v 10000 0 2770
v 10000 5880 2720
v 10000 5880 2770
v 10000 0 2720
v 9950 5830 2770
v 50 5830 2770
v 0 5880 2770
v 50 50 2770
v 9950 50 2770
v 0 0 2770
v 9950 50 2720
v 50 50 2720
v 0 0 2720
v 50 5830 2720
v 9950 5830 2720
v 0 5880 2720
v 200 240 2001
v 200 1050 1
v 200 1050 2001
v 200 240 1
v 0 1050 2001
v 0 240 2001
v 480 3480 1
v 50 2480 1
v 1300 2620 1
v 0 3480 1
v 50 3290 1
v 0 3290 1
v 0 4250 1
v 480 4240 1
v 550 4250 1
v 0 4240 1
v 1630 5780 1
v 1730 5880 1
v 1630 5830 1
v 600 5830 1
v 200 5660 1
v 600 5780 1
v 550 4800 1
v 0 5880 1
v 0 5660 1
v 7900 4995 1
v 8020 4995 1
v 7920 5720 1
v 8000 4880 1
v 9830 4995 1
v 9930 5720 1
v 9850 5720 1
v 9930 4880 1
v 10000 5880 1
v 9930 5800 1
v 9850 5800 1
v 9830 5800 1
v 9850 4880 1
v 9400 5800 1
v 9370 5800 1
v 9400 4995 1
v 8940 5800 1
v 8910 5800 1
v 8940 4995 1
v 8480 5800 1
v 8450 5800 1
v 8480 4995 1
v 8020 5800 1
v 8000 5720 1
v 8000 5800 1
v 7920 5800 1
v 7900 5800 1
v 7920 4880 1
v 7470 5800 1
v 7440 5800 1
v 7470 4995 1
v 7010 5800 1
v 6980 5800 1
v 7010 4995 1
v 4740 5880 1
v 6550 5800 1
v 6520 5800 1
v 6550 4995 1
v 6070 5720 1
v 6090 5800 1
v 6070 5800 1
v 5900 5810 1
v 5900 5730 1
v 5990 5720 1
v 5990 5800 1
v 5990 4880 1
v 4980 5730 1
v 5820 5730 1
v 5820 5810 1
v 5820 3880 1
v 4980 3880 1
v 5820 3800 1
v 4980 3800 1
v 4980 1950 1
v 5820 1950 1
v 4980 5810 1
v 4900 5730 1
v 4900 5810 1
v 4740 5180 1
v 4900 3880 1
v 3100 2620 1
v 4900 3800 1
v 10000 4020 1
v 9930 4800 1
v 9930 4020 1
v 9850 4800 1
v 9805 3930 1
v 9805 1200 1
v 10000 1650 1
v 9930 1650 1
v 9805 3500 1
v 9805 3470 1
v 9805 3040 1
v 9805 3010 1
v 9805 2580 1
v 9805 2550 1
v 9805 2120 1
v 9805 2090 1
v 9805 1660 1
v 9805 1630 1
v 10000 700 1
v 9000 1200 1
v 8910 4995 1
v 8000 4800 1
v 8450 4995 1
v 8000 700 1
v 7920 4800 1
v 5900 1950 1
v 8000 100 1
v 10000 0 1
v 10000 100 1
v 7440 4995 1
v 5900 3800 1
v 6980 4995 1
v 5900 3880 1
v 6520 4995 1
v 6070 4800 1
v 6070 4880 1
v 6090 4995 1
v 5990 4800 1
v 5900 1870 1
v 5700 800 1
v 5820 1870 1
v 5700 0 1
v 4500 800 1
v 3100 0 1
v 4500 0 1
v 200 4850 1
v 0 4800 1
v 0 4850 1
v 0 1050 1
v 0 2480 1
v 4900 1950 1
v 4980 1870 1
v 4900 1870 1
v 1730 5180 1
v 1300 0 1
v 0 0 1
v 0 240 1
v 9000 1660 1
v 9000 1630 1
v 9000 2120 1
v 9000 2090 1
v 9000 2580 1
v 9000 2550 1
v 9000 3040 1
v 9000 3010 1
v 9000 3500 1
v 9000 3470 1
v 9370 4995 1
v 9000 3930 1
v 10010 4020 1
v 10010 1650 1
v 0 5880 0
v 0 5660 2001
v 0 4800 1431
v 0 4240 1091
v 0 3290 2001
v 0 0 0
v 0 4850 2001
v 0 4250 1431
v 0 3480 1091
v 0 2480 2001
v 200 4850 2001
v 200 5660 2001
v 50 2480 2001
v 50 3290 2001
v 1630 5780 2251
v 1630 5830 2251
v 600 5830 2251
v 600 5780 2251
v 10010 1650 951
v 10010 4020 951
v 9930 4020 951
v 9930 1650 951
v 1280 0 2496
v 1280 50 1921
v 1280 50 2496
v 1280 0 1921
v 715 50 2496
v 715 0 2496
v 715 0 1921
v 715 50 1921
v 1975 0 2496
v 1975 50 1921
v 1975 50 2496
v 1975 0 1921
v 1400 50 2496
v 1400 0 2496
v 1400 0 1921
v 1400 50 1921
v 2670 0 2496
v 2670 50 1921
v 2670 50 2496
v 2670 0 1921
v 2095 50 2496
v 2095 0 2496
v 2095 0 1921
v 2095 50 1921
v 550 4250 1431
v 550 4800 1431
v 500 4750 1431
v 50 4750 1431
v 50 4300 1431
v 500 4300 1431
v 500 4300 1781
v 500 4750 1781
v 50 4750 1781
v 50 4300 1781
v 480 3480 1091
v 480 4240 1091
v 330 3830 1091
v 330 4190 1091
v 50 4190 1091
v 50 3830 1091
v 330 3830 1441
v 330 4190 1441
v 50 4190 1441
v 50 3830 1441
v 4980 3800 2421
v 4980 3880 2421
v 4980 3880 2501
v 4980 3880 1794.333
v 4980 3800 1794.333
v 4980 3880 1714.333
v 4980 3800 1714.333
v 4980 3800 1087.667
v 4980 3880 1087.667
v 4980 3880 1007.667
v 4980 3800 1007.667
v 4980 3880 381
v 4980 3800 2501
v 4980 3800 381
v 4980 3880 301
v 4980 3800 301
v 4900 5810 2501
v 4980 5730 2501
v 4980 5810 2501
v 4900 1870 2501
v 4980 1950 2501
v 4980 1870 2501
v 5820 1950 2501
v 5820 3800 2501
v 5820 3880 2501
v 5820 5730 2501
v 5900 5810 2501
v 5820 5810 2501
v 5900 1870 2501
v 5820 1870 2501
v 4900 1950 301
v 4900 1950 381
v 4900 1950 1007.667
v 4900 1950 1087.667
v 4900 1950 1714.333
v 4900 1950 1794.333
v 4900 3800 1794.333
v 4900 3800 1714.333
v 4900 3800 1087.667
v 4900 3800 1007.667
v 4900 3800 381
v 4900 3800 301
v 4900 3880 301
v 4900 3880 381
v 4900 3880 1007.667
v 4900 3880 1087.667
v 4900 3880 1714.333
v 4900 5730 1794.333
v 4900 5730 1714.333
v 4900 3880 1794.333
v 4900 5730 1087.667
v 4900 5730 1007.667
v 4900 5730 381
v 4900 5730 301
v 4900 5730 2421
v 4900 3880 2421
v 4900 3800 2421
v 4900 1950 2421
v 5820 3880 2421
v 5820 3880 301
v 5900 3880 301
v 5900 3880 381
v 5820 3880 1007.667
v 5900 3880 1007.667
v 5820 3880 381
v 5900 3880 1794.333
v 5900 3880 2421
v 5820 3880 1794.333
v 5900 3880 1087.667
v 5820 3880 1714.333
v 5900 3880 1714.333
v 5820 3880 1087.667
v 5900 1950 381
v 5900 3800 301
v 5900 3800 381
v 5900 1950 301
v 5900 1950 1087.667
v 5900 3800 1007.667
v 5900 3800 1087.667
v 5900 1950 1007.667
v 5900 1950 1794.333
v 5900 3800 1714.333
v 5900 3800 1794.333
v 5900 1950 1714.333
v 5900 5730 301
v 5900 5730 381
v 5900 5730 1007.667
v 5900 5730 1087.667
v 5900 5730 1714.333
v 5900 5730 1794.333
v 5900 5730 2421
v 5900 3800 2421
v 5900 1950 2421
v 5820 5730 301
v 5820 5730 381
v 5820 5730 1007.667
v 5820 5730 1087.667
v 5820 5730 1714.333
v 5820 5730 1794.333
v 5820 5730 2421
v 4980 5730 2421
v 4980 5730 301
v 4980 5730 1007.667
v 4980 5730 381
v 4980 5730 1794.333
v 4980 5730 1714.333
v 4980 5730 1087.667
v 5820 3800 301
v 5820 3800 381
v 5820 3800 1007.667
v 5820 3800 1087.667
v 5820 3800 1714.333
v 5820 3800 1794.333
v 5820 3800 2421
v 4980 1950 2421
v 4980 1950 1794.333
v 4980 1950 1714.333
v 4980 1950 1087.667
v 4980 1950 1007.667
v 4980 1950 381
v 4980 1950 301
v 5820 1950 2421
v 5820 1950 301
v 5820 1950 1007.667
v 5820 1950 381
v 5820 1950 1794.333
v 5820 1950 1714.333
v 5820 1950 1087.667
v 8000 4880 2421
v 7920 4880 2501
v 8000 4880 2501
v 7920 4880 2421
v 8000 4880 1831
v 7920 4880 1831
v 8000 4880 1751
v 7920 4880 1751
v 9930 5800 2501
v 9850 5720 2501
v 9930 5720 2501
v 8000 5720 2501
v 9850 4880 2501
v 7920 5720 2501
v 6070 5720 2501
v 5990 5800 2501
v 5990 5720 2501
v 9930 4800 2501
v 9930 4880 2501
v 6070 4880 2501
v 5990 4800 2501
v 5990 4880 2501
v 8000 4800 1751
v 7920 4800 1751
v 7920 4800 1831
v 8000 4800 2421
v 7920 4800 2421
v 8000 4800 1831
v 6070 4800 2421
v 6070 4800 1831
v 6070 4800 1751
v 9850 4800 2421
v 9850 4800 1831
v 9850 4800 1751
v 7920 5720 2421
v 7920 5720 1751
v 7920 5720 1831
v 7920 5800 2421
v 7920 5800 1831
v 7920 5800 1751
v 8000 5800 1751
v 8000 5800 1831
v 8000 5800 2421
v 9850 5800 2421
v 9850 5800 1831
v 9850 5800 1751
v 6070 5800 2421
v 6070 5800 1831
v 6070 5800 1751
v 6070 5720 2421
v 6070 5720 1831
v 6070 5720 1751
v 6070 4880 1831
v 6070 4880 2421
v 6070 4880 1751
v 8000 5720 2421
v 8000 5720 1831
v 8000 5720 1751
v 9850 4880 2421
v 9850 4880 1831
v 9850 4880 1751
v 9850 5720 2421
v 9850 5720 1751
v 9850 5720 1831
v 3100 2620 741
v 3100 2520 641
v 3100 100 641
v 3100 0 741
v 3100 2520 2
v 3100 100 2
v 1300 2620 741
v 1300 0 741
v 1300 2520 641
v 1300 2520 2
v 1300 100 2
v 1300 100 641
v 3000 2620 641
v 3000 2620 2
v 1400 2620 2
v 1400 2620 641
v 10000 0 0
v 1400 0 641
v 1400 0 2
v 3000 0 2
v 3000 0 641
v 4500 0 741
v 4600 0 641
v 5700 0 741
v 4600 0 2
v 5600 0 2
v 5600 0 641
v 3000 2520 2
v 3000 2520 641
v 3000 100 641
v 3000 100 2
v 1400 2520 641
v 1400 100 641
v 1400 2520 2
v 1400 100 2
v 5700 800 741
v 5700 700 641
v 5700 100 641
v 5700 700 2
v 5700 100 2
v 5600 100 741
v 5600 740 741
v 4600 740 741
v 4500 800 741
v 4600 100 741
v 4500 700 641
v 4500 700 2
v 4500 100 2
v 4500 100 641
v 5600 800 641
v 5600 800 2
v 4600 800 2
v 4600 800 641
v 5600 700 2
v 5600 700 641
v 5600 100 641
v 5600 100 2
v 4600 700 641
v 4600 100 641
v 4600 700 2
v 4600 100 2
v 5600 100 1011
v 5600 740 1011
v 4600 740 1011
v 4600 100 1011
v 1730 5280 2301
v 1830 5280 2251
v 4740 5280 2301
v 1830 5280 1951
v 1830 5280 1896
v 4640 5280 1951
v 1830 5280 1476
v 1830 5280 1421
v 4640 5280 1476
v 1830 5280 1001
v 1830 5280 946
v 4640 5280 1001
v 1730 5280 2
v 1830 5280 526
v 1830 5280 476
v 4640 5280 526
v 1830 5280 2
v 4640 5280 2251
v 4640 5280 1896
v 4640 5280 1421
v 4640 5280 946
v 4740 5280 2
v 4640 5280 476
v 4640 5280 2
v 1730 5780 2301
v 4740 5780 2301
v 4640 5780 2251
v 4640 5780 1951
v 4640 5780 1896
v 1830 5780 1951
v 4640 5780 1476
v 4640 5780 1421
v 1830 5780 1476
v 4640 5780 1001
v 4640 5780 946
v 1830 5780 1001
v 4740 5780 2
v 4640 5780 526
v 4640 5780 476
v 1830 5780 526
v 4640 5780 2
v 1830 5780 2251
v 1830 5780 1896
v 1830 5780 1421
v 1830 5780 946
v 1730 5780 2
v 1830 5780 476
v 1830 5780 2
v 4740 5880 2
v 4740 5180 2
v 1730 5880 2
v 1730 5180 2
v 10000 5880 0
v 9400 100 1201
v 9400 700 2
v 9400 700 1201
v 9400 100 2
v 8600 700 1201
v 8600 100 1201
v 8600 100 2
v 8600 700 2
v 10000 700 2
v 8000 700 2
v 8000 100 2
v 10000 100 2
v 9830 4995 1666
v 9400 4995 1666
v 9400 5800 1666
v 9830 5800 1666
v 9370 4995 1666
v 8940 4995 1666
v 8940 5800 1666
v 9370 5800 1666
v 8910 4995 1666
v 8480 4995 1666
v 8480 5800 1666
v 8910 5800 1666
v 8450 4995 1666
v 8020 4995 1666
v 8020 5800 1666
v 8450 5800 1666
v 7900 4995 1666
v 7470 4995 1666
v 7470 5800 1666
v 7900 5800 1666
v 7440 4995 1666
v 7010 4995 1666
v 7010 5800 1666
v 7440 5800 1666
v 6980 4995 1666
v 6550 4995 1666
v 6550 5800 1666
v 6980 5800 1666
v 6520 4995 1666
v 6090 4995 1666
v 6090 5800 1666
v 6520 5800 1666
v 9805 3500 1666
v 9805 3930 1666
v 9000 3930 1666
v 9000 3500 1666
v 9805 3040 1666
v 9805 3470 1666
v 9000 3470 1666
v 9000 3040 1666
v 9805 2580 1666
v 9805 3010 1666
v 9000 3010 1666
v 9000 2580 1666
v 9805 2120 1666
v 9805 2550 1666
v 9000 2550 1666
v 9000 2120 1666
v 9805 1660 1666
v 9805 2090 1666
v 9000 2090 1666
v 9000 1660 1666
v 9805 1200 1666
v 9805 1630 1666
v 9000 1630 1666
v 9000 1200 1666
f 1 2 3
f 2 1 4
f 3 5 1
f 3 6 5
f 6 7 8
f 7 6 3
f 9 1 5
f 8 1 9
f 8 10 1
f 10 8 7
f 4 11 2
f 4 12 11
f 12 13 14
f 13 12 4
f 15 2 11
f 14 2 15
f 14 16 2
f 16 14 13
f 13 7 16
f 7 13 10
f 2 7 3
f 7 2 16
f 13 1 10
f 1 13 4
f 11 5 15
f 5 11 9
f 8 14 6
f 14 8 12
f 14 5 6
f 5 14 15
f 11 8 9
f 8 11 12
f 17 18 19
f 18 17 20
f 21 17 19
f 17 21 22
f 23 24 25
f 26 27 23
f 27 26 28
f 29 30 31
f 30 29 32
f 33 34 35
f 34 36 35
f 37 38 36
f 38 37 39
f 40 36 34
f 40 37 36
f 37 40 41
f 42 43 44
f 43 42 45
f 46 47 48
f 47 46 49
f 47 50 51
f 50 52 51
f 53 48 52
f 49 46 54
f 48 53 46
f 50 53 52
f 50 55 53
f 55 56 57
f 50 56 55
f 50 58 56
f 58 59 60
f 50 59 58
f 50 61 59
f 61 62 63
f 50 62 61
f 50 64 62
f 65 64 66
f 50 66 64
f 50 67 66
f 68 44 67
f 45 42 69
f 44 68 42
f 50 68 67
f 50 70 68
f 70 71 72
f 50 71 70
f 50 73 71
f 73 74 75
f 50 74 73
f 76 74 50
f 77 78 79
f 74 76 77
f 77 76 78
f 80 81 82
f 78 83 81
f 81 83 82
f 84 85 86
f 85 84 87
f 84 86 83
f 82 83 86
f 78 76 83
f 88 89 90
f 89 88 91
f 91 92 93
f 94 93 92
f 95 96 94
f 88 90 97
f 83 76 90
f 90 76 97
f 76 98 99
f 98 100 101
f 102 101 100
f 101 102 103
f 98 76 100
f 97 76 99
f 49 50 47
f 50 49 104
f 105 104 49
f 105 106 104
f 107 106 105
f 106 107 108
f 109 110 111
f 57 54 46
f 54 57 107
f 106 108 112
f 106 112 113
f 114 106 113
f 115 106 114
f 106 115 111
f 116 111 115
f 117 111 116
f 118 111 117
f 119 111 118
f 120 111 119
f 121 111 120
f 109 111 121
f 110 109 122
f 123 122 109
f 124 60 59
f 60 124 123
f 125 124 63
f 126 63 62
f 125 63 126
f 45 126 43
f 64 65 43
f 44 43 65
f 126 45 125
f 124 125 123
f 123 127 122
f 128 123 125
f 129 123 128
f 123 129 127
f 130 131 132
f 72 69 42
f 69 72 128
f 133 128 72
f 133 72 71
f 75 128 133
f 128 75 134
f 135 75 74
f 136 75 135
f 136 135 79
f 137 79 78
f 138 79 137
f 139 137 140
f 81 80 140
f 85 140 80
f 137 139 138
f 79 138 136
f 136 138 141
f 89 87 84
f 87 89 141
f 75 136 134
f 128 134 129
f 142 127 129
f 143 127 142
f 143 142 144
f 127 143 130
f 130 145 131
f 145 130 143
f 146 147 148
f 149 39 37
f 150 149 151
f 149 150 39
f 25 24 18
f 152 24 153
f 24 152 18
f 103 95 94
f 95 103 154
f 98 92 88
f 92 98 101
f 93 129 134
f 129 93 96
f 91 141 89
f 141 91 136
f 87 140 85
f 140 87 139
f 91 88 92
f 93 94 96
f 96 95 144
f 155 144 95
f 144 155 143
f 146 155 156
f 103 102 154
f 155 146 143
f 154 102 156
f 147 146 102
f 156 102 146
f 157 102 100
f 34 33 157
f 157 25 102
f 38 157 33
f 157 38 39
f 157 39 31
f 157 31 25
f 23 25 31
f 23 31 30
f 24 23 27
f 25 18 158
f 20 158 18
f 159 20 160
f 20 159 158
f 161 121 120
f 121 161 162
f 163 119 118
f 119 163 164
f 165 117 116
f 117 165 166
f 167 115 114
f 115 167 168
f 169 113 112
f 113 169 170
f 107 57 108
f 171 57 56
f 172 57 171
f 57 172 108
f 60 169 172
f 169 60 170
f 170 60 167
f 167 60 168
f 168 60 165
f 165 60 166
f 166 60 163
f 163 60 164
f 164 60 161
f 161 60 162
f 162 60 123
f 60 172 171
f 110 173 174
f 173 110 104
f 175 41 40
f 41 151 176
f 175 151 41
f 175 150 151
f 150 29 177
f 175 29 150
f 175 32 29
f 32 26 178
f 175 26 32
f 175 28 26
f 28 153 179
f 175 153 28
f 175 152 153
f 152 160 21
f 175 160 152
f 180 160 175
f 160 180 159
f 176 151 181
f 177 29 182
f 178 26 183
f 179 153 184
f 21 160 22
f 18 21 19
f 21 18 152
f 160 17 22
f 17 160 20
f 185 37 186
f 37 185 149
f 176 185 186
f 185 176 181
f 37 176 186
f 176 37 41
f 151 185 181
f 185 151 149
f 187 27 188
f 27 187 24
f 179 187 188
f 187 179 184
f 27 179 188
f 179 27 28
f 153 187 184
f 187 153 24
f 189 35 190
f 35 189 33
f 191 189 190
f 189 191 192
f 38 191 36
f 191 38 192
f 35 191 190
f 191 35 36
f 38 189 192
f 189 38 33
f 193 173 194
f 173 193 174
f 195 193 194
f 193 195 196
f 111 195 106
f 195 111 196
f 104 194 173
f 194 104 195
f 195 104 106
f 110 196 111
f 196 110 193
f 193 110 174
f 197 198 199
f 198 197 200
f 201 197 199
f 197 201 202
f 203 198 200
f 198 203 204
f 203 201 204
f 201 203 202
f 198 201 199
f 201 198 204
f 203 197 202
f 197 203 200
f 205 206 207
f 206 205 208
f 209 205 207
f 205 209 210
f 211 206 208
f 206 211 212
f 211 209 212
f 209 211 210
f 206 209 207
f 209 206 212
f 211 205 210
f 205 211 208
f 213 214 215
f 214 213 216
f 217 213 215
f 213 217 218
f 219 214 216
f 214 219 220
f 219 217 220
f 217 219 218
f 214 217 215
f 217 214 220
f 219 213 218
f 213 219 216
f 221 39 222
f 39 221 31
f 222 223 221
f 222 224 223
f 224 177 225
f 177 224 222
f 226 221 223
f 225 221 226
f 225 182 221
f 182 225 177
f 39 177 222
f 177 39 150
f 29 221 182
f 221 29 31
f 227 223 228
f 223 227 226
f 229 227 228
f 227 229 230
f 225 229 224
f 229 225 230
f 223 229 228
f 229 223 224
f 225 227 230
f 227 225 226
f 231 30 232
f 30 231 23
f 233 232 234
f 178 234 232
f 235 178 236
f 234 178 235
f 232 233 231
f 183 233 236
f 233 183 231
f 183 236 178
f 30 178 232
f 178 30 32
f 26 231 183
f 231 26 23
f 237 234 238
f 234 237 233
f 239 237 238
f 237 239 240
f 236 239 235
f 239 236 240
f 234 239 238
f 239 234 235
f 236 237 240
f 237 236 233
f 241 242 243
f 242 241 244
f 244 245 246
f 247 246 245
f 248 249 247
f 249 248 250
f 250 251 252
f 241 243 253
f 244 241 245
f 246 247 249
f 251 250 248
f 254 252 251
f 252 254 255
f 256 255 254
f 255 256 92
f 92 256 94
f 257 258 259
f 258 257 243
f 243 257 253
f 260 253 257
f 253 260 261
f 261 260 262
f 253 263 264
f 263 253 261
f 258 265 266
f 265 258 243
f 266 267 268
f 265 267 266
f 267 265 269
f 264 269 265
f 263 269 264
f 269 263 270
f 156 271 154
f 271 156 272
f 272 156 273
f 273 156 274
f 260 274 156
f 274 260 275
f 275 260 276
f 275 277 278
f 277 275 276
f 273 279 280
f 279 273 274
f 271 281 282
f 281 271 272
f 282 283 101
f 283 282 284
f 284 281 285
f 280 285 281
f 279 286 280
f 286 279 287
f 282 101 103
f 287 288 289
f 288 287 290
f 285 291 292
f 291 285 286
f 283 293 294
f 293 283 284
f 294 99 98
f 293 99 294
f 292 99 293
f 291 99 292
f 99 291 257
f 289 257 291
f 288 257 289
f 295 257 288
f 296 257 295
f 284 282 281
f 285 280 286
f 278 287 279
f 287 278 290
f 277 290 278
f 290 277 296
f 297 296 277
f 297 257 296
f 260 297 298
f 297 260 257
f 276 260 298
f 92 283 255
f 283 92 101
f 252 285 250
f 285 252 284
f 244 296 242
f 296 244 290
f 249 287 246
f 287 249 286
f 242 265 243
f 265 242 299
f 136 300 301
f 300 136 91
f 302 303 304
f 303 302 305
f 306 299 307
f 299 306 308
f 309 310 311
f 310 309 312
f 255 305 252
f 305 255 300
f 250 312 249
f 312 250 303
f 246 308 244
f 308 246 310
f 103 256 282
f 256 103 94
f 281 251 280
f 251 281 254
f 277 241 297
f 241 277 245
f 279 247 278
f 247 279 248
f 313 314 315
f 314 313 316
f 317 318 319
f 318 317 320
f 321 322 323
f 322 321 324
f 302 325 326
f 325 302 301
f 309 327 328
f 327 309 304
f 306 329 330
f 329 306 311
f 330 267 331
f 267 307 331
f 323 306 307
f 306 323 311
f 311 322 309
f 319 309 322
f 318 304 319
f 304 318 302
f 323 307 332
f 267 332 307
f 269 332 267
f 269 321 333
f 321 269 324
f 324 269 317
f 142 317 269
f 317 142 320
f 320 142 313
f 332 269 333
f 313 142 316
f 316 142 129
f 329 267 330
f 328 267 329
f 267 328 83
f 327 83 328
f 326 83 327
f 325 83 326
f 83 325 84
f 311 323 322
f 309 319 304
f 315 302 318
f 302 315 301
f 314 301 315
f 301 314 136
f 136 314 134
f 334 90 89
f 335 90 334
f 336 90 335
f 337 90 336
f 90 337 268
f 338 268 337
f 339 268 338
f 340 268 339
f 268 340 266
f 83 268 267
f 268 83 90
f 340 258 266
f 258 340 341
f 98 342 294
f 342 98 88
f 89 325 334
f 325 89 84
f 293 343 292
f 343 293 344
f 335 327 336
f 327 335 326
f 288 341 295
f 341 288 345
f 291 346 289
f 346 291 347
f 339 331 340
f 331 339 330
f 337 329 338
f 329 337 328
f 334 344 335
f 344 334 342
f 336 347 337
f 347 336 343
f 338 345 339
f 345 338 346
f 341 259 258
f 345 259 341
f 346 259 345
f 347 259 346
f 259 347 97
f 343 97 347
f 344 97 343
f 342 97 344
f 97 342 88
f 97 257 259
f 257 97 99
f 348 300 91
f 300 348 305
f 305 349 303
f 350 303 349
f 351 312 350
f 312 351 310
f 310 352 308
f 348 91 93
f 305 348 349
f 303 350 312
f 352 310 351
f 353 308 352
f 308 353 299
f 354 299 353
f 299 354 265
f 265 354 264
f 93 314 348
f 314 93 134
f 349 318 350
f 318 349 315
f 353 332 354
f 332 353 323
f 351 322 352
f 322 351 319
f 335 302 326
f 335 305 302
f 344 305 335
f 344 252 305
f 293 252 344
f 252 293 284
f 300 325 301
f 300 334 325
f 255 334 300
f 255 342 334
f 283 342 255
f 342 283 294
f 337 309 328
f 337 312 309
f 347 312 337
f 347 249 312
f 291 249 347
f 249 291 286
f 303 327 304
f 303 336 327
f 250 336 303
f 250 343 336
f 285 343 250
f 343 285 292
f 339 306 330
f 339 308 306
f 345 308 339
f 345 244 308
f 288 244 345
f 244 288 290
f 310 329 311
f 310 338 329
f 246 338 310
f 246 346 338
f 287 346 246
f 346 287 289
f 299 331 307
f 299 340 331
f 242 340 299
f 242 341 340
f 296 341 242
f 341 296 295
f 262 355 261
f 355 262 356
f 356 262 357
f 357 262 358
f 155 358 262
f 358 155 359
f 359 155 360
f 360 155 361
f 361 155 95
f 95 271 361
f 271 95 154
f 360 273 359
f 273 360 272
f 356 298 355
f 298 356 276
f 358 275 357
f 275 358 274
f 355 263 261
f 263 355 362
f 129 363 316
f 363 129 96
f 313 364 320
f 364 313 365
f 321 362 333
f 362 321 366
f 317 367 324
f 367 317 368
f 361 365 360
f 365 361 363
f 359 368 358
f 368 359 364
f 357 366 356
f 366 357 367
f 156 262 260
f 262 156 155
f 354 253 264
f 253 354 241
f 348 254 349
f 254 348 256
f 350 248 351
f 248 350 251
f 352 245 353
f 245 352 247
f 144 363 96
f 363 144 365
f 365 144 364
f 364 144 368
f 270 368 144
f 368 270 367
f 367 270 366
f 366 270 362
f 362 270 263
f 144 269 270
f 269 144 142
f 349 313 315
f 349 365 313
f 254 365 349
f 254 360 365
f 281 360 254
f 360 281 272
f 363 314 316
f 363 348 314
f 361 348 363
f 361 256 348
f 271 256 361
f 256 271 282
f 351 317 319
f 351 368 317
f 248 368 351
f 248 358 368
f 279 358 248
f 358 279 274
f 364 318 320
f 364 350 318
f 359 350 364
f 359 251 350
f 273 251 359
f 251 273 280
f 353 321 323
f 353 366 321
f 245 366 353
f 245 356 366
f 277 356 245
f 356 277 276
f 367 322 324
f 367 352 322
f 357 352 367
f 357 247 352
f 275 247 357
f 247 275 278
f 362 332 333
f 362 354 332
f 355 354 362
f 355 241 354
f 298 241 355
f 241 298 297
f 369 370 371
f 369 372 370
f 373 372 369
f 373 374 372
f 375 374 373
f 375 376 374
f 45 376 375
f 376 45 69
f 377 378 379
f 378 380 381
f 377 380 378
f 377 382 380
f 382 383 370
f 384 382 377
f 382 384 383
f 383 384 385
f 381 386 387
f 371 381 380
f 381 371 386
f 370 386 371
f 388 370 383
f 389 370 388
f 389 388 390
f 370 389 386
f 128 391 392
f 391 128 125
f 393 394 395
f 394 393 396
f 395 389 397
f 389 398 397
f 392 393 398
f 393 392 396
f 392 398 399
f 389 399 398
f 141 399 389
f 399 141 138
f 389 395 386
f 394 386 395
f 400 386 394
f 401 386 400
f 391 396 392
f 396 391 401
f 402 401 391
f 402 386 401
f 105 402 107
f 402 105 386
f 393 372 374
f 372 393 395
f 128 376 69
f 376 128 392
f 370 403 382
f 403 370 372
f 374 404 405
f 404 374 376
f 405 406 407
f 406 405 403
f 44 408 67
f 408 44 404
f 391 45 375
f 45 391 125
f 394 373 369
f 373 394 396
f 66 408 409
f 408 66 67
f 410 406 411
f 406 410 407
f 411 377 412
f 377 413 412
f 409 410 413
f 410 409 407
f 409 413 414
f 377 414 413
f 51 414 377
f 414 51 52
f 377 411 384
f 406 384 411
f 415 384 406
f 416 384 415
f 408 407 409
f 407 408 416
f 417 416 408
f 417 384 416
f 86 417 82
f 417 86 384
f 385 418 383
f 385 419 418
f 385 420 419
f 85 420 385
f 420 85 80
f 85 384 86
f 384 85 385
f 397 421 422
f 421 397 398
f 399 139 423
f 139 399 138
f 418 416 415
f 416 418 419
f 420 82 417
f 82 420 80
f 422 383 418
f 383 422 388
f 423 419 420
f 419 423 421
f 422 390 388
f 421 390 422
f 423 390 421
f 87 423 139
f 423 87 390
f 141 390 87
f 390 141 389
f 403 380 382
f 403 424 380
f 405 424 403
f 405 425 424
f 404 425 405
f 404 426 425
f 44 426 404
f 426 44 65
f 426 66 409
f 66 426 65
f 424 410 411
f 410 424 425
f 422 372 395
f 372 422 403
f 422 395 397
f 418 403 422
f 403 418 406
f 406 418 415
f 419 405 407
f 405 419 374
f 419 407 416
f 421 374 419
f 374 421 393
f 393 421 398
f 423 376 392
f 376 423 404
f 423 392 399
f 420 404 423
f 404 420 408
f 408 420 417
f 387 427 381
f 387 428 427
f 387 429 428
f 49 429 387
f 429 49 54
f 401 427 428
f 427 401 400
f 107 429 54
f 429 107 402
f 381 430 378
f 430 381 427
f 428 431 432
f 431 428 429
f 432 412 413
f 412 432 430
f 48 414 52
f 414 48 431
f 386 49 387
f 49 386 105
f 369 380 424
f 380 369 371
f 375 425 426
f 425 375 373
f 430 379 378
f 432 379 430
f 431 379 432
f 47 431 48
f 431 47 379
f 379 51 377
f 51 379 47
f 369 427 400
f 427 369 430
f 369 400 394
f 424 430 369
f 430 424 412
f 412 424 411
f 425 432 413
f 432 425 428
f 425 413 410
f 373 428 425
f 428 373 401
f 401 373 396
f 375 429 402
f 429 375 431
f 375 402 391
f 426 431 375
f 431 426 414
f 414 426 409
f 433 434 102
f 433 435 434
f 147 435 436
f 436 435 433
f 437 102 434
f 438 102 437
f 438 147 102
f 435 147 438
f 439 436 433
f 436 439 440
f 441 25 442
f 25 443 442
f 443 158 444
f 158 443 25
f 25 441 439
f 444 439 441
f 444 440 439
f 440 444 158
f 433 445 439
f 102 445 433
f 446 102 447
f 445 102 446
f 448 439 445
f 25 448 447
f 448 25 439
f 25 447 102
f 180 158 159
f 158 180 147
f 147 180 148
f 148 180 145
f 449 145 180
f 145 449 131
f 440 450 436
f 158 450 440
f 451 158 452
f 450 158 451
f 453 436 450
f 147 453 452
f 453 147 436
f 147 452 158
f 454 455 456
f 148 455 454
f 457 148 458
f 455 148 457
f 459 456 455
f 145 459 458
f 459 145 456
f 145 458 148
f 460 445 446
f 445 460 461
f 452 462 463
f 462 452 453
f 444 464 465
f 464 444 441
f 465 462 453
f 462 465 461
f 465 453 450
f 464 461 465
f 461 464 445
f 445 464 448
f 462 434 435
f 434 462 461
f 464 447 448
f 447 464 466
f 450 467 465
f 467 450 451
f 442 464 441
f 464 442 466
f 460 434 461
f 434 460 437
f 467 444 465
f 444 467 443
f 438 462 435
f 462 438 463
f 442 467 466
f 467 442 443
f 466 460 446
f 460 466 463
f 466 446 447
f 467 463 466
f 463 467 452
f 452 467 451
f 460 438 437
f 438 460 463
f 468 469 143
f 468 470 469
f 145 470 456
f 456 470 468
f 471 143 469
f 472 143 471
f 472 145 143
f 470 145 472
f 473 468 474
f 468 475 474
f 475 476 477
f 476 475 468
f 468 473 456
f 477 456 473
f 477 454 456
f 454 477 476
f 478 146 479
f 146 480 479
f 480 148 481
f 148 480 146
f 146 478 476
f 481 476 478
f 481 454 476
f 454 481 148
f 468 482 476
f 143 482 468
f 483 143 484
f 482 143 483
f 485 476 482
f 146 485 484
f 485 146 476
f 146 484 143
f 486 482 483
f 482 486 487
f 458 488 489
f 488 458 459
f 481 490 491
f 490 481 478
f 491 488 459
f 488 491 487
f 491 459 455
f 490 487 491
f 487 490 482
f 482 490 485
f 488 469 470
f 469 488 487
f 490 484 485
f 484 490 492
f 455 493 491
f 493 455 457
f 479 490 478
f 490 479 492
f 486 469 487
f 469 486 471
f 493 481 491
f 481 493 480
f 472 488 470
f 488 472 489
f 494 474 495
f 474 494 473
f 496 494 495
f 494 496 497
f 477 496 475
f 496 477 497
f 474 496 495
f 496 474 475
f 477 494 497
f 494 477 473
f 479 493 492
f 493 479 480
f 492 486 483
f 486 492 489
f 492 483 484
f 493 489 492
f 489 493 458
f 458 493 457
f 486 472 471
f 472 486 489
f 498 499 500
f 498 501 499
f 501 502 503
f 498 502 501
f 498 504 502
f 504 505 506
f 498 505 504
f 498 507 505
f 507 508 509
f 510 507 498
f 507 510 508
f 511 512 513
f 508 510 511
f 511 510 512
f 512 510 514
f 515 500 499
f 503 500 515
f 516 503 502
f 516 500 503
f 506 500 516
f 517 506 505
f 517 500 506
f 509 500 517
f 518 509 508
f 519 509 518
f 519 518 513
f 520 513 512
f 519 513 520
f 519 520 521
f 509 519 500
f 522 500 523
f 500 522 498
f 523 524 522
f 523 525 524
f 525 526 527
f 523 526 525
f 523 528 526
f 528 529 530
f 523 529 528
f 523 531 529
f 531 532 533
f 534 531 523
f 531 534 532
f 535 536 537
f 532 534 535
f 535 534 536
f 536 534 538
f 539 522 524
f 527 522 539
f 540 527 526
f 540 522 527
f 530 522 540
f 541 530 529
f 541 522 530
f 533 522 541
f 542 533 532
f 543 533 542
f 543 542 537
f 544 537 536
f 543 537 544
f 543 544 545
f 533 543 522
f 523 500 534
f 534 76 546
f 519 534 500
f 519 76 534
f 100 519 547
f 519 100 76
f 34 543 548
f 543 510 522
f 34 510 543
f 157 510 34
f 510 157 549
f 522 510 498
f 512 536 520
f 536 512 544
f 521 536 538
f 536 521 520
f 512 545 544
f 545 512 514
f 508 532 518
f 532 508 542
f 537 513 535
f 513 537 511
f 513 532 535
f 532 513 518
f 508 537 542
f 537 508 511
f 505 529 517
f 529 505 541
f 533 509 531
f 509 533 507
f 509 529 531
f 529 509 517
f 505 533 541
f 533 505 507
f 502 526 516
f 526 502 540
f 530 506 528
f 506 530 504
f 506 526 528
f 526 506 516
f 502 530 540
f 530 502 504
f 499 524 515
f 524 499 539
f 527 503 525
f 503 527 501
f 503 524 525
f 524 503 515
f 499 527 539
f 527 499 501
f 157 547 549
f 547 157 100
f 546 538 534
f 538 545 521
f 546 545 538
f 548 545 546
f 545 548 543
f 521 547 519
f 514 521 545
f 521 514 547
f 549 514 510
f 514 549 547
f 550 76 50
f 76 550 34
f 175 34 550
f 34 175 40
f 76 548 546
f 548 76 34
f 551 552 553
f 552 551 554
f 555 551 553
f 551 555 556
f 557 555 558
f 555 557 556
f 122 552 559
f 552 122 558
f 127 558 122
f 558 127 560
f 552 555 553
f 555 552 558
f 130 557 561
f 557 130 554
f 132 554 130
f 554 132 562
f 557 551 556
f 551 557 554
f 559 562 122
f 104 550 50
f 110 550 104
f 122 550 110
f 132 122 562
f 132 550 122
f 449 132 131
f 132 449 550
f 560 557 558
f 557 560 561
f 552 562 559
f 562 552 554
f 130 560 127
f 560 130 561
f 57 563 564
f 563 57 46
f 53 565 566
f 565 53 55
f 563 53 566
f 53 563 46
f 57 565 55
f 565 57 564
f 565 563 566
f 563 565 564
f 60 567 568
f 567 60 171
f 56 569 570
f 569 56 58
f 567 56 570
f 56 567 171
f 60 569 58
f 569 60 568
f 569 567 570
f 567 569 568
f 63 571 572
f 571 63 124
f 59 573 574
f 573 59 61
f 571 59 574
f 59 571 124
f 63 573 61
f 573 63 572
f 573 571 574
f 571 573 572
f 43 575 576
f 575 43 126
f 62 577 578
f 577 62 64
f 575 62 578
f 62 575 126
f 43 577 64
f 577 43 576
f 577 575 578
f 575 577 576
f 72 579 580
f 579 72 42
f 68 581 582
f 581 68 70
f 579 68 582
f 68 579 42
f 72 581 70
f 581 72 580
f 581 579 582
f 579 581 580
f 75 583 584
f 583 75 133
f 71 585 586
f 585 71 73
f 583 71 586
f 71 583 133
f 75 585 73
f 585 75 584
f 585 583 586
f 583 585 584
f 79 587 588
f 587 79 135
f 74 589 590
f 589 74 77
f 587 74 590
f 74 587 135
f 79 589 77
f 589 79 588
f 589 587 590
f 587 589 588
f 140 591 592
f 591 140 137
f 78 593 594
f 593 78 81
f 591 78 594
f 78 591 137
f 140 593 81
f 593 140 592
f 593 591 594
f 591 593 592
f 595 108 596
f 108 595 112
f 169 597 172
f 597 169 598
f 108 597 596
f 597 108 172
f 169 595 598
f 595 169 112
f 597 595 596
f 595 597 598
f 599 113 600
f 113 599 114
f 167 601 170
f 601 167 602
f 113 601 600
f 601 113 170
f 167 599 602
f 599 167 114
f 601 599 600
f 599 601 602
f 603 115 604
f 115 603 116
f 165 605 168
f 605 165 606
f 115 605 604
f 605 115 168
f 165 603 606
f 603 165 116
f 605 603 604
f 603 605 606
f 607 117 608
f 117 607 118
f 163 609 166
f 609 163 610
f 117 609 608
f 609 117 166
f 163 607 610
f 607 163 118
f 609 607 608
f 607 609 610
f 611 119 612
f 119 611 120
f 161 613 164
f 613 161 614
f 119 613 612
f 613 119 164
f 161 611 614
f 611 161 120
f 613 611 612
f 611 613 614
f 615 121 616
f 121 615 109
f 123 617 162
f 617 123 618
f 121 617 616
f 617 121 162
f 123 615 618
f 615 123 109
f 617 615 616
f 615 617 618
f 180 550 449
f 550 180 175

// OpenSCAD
cube([10000, 5880, 1]); // room
translate([0,0,2720]) difference() {
    cube([10000, 5880, 50]);
    translate([50,50,-1]) cube([9900, 5780, 52]);
} // min ceiling


module desk_island() {
    color("#00f") {
        difference() {
            cube([1800, 2620, 740]);
            translate([100, -100, -100]) cube([1600, 2820, 740]);
            translate([-100, 100, -100]) cube([2000, 2420, 740]);
        }
    }

    cube([1800, 2620, 1]); // the flickering floor was annoying
}

module cupboard() {
    color("#3c4254") cube([480, 760, 1090]);
    color("#7e888e") translate([50,350,1090]) cube([280, 360, 350]);
}

module fridge() {
    color("#fff") cube([550, 550, 1430]);
    color("#3c4245") translate([50,50,1430]) cube([450, 450, 350]);
}

module storagerack() {
    color("#aaa9ad") difference() {
        cube([500, 3010, 2300]);
        translate([-100,100,0]) cube([700, 2810, 475]);
        translate([-100,100,525]) cube([700, 2810, 420]);
        translate([-100,100,1000]) cube([700, 2810, 420]);
        translate([-100,100,1475]) cube([700, 2810, 420]);
        translate([-100,100,1950]) cube([700, 2810, 300]);
    }

    translate([-100,0,0]) cube([700, 3010, 1]);
}

module serverrack() {
    color("#000") cube([800,600,1200]);
    color("#f00") translate([-600,0,0]) cube([2000,600,1]);
}

module lasertable() {
    translate([0, 0, 0]) {
        color("#f0f") {
            difference() {
                cube([1200, 800, 740]);
                translate([100, -100, -100]) cube([1000, 1000, 740]);
                translate([-100, 100, -100]) cube([1400, 600, 740]);
            }
        }

        color("#f88") translate([100,100,740])  cube([1000, 640, 270]); // laser

        cube([1200, 800, 1]); // the flickering floor was annoying
    }
}

module voyagerstack() {
    color("#8b4513") cube([805,430,140]);

    module box() {
        translate([0,0,]) color("#000") cube([805,430,265]);
        translate([0,0,265]) color("#f00") cube([805,430,40]);
    }

    translate([0,0,140+(0*305)]) box();
    translate([0,0,140+(1*305)]) box();
    translate([0,0,140+(2*305)]) box();
    translate([0,0,140+(3*305)]) box();
    translate([0,0,140+(4*305)]) box();

}

// https://shop.almasy.eu/nl/product/detail/2-niveaus-incl-spaanplaat/0YBKq
module almamidi(rackw=800, rackl=2010, rackh=2500, shelves=4, shelfstarth=300) {
    // rackl is the *total* length, including pole thickness!
    polet=80; // seems to be always 80

    color("#00f") {
        translate([0, 0, 0])  cube([polet,polet,rackh]);
        translate([rackw-polet, rackl-polet, 0]) cube([polet,polet,rackh]);
        translate([0, rackl-polet, 0]) cube([polet,polet,rackh]);
        translate([rackw-polet, 0, 0]) cube([polet,polet,rackh]);
    }

    module shelf() {
        translate([0, polet, 0]) color("#ff5733") cube([polet, rackl-(2*polet), polet]);
        translate([rackw-polet, polet, 0]) color("#ff5733") cube([polet, rackl-(2*polet), polet]);
        translate([polet,polet,0]) color("#cdaa7d") cube([rackw-(2*polet), rackl-(2*polet), polet]);
    }

    availh=rackh-polet-shelfstarth;
    shelves = shelves-1;

    shelfspacing = (availh - (shelves * polet)) / shelves;

    for (layer = [0:1:shelves]) {
        translate([0,0,(shelfspacing*layer)+(layer*polet)+shelfstarth]) shelf();
    }
}

translate([0, 0, 1]) color("#ebebeb") {
    translate([0, 240, 0]) cube([200, 810, 2000]); // heating
    translate([0, 4850, 0]) cube([200, 810, 2000]); // heating
    translate([0, 2480, 0]) cube([50, 810, 2000]); // door

    translate([600, 5780, 0]) cube([1030, 50, 2250]); // window

    translate([9930, 1650, 0]) cube([80, 2370, 950]); // heating

    translate([715,0,1920]) cube([565,50,575]); // small window
    translate([1400,0,1920]) cube([575,50,575]); // small window
    translate([2095,0,1920]) cube([575,50,575]); // small window
}

translate([0, 0, 1]) {
    translate([0, 4250, 0]) fridge(); // fridge
    translate([0, 3480, 0]) cupboard(); // cupboard (coffee)

    //translate([5000, 5780-3010, 0]) storagerack(); // strorage rack
    //translate([5520, 5780-3010, 0]) storagerack(); // strorage rack

    translate([4900,3800,0]) almamidi(rackw=1000); // almamidi
    translate([4900,1790+80,0]) almamidi(rackw=1000); // almamidi

    translate([8000,4800,0]) rotate(90) almamidi(rackw=1000, shelves=2, shelfstarth=1750); // almamidi over boxes
    translate([9930,4800,0]) rotate(90) almamidi(rackw=1000, shelves=2, shelfstarth=1750); // almamidi over boxes

    translate([1300, 0,0]) desk_island(); // desk island

    translate([4500,0,0]) lasertable(); // laser


    translate([1730, 5780, 0]) rotate(270) storagerack();

    translate([8600,100,0]) serverrack();

    translate([9900-(0*460)-70,5800,0]) translate([-430,0,0]) rotate(270) voyagerstack();
    translate([9900-(1*460)-70,5800,0]) translate([-430,0,0]) rotate(270) voyagerstack();
    translate([9900-(2*460)-70,5800,0]) translate([-430,0,0]) rotate(270) voyagerstack();
    translate([9900-(3*460)-70,5800,0]) translate([-430,0,0]) rotate(270) voyagerstack();
    translate([9900-(4*460)-160,5800,0]) translate([-430,0,0]) rotate(270) voyagerstack();
    translate([9900-(5*460)-160,5800,0]) translate([-430,0,0]) rotate(270) voyagerstack();
    translate([9900-(6*460)-160,5800,0]) translate([-430,0,0]) rotate(270) voyagerstack();
    translate([9900-(7*460)-160,5800,0]) translate([-430,0,0]) rotate(270) voyagerstack();

    translate([9000, 3500-(0*460), 0]) voyagerstack();
    translate([9000, 3500-(1*460), 0]) voyagerstack();
    translate([9000, 3500-(2*460), 0]) voyagerstack();
    translate([9000, 3500-(3*460), 0]) voyagerstack();
    translate([9000, 3500-(4*460), 0]) voyagerstack();
    translate([9000, 3500-(5*460), 0]) voyagerstack();
}
